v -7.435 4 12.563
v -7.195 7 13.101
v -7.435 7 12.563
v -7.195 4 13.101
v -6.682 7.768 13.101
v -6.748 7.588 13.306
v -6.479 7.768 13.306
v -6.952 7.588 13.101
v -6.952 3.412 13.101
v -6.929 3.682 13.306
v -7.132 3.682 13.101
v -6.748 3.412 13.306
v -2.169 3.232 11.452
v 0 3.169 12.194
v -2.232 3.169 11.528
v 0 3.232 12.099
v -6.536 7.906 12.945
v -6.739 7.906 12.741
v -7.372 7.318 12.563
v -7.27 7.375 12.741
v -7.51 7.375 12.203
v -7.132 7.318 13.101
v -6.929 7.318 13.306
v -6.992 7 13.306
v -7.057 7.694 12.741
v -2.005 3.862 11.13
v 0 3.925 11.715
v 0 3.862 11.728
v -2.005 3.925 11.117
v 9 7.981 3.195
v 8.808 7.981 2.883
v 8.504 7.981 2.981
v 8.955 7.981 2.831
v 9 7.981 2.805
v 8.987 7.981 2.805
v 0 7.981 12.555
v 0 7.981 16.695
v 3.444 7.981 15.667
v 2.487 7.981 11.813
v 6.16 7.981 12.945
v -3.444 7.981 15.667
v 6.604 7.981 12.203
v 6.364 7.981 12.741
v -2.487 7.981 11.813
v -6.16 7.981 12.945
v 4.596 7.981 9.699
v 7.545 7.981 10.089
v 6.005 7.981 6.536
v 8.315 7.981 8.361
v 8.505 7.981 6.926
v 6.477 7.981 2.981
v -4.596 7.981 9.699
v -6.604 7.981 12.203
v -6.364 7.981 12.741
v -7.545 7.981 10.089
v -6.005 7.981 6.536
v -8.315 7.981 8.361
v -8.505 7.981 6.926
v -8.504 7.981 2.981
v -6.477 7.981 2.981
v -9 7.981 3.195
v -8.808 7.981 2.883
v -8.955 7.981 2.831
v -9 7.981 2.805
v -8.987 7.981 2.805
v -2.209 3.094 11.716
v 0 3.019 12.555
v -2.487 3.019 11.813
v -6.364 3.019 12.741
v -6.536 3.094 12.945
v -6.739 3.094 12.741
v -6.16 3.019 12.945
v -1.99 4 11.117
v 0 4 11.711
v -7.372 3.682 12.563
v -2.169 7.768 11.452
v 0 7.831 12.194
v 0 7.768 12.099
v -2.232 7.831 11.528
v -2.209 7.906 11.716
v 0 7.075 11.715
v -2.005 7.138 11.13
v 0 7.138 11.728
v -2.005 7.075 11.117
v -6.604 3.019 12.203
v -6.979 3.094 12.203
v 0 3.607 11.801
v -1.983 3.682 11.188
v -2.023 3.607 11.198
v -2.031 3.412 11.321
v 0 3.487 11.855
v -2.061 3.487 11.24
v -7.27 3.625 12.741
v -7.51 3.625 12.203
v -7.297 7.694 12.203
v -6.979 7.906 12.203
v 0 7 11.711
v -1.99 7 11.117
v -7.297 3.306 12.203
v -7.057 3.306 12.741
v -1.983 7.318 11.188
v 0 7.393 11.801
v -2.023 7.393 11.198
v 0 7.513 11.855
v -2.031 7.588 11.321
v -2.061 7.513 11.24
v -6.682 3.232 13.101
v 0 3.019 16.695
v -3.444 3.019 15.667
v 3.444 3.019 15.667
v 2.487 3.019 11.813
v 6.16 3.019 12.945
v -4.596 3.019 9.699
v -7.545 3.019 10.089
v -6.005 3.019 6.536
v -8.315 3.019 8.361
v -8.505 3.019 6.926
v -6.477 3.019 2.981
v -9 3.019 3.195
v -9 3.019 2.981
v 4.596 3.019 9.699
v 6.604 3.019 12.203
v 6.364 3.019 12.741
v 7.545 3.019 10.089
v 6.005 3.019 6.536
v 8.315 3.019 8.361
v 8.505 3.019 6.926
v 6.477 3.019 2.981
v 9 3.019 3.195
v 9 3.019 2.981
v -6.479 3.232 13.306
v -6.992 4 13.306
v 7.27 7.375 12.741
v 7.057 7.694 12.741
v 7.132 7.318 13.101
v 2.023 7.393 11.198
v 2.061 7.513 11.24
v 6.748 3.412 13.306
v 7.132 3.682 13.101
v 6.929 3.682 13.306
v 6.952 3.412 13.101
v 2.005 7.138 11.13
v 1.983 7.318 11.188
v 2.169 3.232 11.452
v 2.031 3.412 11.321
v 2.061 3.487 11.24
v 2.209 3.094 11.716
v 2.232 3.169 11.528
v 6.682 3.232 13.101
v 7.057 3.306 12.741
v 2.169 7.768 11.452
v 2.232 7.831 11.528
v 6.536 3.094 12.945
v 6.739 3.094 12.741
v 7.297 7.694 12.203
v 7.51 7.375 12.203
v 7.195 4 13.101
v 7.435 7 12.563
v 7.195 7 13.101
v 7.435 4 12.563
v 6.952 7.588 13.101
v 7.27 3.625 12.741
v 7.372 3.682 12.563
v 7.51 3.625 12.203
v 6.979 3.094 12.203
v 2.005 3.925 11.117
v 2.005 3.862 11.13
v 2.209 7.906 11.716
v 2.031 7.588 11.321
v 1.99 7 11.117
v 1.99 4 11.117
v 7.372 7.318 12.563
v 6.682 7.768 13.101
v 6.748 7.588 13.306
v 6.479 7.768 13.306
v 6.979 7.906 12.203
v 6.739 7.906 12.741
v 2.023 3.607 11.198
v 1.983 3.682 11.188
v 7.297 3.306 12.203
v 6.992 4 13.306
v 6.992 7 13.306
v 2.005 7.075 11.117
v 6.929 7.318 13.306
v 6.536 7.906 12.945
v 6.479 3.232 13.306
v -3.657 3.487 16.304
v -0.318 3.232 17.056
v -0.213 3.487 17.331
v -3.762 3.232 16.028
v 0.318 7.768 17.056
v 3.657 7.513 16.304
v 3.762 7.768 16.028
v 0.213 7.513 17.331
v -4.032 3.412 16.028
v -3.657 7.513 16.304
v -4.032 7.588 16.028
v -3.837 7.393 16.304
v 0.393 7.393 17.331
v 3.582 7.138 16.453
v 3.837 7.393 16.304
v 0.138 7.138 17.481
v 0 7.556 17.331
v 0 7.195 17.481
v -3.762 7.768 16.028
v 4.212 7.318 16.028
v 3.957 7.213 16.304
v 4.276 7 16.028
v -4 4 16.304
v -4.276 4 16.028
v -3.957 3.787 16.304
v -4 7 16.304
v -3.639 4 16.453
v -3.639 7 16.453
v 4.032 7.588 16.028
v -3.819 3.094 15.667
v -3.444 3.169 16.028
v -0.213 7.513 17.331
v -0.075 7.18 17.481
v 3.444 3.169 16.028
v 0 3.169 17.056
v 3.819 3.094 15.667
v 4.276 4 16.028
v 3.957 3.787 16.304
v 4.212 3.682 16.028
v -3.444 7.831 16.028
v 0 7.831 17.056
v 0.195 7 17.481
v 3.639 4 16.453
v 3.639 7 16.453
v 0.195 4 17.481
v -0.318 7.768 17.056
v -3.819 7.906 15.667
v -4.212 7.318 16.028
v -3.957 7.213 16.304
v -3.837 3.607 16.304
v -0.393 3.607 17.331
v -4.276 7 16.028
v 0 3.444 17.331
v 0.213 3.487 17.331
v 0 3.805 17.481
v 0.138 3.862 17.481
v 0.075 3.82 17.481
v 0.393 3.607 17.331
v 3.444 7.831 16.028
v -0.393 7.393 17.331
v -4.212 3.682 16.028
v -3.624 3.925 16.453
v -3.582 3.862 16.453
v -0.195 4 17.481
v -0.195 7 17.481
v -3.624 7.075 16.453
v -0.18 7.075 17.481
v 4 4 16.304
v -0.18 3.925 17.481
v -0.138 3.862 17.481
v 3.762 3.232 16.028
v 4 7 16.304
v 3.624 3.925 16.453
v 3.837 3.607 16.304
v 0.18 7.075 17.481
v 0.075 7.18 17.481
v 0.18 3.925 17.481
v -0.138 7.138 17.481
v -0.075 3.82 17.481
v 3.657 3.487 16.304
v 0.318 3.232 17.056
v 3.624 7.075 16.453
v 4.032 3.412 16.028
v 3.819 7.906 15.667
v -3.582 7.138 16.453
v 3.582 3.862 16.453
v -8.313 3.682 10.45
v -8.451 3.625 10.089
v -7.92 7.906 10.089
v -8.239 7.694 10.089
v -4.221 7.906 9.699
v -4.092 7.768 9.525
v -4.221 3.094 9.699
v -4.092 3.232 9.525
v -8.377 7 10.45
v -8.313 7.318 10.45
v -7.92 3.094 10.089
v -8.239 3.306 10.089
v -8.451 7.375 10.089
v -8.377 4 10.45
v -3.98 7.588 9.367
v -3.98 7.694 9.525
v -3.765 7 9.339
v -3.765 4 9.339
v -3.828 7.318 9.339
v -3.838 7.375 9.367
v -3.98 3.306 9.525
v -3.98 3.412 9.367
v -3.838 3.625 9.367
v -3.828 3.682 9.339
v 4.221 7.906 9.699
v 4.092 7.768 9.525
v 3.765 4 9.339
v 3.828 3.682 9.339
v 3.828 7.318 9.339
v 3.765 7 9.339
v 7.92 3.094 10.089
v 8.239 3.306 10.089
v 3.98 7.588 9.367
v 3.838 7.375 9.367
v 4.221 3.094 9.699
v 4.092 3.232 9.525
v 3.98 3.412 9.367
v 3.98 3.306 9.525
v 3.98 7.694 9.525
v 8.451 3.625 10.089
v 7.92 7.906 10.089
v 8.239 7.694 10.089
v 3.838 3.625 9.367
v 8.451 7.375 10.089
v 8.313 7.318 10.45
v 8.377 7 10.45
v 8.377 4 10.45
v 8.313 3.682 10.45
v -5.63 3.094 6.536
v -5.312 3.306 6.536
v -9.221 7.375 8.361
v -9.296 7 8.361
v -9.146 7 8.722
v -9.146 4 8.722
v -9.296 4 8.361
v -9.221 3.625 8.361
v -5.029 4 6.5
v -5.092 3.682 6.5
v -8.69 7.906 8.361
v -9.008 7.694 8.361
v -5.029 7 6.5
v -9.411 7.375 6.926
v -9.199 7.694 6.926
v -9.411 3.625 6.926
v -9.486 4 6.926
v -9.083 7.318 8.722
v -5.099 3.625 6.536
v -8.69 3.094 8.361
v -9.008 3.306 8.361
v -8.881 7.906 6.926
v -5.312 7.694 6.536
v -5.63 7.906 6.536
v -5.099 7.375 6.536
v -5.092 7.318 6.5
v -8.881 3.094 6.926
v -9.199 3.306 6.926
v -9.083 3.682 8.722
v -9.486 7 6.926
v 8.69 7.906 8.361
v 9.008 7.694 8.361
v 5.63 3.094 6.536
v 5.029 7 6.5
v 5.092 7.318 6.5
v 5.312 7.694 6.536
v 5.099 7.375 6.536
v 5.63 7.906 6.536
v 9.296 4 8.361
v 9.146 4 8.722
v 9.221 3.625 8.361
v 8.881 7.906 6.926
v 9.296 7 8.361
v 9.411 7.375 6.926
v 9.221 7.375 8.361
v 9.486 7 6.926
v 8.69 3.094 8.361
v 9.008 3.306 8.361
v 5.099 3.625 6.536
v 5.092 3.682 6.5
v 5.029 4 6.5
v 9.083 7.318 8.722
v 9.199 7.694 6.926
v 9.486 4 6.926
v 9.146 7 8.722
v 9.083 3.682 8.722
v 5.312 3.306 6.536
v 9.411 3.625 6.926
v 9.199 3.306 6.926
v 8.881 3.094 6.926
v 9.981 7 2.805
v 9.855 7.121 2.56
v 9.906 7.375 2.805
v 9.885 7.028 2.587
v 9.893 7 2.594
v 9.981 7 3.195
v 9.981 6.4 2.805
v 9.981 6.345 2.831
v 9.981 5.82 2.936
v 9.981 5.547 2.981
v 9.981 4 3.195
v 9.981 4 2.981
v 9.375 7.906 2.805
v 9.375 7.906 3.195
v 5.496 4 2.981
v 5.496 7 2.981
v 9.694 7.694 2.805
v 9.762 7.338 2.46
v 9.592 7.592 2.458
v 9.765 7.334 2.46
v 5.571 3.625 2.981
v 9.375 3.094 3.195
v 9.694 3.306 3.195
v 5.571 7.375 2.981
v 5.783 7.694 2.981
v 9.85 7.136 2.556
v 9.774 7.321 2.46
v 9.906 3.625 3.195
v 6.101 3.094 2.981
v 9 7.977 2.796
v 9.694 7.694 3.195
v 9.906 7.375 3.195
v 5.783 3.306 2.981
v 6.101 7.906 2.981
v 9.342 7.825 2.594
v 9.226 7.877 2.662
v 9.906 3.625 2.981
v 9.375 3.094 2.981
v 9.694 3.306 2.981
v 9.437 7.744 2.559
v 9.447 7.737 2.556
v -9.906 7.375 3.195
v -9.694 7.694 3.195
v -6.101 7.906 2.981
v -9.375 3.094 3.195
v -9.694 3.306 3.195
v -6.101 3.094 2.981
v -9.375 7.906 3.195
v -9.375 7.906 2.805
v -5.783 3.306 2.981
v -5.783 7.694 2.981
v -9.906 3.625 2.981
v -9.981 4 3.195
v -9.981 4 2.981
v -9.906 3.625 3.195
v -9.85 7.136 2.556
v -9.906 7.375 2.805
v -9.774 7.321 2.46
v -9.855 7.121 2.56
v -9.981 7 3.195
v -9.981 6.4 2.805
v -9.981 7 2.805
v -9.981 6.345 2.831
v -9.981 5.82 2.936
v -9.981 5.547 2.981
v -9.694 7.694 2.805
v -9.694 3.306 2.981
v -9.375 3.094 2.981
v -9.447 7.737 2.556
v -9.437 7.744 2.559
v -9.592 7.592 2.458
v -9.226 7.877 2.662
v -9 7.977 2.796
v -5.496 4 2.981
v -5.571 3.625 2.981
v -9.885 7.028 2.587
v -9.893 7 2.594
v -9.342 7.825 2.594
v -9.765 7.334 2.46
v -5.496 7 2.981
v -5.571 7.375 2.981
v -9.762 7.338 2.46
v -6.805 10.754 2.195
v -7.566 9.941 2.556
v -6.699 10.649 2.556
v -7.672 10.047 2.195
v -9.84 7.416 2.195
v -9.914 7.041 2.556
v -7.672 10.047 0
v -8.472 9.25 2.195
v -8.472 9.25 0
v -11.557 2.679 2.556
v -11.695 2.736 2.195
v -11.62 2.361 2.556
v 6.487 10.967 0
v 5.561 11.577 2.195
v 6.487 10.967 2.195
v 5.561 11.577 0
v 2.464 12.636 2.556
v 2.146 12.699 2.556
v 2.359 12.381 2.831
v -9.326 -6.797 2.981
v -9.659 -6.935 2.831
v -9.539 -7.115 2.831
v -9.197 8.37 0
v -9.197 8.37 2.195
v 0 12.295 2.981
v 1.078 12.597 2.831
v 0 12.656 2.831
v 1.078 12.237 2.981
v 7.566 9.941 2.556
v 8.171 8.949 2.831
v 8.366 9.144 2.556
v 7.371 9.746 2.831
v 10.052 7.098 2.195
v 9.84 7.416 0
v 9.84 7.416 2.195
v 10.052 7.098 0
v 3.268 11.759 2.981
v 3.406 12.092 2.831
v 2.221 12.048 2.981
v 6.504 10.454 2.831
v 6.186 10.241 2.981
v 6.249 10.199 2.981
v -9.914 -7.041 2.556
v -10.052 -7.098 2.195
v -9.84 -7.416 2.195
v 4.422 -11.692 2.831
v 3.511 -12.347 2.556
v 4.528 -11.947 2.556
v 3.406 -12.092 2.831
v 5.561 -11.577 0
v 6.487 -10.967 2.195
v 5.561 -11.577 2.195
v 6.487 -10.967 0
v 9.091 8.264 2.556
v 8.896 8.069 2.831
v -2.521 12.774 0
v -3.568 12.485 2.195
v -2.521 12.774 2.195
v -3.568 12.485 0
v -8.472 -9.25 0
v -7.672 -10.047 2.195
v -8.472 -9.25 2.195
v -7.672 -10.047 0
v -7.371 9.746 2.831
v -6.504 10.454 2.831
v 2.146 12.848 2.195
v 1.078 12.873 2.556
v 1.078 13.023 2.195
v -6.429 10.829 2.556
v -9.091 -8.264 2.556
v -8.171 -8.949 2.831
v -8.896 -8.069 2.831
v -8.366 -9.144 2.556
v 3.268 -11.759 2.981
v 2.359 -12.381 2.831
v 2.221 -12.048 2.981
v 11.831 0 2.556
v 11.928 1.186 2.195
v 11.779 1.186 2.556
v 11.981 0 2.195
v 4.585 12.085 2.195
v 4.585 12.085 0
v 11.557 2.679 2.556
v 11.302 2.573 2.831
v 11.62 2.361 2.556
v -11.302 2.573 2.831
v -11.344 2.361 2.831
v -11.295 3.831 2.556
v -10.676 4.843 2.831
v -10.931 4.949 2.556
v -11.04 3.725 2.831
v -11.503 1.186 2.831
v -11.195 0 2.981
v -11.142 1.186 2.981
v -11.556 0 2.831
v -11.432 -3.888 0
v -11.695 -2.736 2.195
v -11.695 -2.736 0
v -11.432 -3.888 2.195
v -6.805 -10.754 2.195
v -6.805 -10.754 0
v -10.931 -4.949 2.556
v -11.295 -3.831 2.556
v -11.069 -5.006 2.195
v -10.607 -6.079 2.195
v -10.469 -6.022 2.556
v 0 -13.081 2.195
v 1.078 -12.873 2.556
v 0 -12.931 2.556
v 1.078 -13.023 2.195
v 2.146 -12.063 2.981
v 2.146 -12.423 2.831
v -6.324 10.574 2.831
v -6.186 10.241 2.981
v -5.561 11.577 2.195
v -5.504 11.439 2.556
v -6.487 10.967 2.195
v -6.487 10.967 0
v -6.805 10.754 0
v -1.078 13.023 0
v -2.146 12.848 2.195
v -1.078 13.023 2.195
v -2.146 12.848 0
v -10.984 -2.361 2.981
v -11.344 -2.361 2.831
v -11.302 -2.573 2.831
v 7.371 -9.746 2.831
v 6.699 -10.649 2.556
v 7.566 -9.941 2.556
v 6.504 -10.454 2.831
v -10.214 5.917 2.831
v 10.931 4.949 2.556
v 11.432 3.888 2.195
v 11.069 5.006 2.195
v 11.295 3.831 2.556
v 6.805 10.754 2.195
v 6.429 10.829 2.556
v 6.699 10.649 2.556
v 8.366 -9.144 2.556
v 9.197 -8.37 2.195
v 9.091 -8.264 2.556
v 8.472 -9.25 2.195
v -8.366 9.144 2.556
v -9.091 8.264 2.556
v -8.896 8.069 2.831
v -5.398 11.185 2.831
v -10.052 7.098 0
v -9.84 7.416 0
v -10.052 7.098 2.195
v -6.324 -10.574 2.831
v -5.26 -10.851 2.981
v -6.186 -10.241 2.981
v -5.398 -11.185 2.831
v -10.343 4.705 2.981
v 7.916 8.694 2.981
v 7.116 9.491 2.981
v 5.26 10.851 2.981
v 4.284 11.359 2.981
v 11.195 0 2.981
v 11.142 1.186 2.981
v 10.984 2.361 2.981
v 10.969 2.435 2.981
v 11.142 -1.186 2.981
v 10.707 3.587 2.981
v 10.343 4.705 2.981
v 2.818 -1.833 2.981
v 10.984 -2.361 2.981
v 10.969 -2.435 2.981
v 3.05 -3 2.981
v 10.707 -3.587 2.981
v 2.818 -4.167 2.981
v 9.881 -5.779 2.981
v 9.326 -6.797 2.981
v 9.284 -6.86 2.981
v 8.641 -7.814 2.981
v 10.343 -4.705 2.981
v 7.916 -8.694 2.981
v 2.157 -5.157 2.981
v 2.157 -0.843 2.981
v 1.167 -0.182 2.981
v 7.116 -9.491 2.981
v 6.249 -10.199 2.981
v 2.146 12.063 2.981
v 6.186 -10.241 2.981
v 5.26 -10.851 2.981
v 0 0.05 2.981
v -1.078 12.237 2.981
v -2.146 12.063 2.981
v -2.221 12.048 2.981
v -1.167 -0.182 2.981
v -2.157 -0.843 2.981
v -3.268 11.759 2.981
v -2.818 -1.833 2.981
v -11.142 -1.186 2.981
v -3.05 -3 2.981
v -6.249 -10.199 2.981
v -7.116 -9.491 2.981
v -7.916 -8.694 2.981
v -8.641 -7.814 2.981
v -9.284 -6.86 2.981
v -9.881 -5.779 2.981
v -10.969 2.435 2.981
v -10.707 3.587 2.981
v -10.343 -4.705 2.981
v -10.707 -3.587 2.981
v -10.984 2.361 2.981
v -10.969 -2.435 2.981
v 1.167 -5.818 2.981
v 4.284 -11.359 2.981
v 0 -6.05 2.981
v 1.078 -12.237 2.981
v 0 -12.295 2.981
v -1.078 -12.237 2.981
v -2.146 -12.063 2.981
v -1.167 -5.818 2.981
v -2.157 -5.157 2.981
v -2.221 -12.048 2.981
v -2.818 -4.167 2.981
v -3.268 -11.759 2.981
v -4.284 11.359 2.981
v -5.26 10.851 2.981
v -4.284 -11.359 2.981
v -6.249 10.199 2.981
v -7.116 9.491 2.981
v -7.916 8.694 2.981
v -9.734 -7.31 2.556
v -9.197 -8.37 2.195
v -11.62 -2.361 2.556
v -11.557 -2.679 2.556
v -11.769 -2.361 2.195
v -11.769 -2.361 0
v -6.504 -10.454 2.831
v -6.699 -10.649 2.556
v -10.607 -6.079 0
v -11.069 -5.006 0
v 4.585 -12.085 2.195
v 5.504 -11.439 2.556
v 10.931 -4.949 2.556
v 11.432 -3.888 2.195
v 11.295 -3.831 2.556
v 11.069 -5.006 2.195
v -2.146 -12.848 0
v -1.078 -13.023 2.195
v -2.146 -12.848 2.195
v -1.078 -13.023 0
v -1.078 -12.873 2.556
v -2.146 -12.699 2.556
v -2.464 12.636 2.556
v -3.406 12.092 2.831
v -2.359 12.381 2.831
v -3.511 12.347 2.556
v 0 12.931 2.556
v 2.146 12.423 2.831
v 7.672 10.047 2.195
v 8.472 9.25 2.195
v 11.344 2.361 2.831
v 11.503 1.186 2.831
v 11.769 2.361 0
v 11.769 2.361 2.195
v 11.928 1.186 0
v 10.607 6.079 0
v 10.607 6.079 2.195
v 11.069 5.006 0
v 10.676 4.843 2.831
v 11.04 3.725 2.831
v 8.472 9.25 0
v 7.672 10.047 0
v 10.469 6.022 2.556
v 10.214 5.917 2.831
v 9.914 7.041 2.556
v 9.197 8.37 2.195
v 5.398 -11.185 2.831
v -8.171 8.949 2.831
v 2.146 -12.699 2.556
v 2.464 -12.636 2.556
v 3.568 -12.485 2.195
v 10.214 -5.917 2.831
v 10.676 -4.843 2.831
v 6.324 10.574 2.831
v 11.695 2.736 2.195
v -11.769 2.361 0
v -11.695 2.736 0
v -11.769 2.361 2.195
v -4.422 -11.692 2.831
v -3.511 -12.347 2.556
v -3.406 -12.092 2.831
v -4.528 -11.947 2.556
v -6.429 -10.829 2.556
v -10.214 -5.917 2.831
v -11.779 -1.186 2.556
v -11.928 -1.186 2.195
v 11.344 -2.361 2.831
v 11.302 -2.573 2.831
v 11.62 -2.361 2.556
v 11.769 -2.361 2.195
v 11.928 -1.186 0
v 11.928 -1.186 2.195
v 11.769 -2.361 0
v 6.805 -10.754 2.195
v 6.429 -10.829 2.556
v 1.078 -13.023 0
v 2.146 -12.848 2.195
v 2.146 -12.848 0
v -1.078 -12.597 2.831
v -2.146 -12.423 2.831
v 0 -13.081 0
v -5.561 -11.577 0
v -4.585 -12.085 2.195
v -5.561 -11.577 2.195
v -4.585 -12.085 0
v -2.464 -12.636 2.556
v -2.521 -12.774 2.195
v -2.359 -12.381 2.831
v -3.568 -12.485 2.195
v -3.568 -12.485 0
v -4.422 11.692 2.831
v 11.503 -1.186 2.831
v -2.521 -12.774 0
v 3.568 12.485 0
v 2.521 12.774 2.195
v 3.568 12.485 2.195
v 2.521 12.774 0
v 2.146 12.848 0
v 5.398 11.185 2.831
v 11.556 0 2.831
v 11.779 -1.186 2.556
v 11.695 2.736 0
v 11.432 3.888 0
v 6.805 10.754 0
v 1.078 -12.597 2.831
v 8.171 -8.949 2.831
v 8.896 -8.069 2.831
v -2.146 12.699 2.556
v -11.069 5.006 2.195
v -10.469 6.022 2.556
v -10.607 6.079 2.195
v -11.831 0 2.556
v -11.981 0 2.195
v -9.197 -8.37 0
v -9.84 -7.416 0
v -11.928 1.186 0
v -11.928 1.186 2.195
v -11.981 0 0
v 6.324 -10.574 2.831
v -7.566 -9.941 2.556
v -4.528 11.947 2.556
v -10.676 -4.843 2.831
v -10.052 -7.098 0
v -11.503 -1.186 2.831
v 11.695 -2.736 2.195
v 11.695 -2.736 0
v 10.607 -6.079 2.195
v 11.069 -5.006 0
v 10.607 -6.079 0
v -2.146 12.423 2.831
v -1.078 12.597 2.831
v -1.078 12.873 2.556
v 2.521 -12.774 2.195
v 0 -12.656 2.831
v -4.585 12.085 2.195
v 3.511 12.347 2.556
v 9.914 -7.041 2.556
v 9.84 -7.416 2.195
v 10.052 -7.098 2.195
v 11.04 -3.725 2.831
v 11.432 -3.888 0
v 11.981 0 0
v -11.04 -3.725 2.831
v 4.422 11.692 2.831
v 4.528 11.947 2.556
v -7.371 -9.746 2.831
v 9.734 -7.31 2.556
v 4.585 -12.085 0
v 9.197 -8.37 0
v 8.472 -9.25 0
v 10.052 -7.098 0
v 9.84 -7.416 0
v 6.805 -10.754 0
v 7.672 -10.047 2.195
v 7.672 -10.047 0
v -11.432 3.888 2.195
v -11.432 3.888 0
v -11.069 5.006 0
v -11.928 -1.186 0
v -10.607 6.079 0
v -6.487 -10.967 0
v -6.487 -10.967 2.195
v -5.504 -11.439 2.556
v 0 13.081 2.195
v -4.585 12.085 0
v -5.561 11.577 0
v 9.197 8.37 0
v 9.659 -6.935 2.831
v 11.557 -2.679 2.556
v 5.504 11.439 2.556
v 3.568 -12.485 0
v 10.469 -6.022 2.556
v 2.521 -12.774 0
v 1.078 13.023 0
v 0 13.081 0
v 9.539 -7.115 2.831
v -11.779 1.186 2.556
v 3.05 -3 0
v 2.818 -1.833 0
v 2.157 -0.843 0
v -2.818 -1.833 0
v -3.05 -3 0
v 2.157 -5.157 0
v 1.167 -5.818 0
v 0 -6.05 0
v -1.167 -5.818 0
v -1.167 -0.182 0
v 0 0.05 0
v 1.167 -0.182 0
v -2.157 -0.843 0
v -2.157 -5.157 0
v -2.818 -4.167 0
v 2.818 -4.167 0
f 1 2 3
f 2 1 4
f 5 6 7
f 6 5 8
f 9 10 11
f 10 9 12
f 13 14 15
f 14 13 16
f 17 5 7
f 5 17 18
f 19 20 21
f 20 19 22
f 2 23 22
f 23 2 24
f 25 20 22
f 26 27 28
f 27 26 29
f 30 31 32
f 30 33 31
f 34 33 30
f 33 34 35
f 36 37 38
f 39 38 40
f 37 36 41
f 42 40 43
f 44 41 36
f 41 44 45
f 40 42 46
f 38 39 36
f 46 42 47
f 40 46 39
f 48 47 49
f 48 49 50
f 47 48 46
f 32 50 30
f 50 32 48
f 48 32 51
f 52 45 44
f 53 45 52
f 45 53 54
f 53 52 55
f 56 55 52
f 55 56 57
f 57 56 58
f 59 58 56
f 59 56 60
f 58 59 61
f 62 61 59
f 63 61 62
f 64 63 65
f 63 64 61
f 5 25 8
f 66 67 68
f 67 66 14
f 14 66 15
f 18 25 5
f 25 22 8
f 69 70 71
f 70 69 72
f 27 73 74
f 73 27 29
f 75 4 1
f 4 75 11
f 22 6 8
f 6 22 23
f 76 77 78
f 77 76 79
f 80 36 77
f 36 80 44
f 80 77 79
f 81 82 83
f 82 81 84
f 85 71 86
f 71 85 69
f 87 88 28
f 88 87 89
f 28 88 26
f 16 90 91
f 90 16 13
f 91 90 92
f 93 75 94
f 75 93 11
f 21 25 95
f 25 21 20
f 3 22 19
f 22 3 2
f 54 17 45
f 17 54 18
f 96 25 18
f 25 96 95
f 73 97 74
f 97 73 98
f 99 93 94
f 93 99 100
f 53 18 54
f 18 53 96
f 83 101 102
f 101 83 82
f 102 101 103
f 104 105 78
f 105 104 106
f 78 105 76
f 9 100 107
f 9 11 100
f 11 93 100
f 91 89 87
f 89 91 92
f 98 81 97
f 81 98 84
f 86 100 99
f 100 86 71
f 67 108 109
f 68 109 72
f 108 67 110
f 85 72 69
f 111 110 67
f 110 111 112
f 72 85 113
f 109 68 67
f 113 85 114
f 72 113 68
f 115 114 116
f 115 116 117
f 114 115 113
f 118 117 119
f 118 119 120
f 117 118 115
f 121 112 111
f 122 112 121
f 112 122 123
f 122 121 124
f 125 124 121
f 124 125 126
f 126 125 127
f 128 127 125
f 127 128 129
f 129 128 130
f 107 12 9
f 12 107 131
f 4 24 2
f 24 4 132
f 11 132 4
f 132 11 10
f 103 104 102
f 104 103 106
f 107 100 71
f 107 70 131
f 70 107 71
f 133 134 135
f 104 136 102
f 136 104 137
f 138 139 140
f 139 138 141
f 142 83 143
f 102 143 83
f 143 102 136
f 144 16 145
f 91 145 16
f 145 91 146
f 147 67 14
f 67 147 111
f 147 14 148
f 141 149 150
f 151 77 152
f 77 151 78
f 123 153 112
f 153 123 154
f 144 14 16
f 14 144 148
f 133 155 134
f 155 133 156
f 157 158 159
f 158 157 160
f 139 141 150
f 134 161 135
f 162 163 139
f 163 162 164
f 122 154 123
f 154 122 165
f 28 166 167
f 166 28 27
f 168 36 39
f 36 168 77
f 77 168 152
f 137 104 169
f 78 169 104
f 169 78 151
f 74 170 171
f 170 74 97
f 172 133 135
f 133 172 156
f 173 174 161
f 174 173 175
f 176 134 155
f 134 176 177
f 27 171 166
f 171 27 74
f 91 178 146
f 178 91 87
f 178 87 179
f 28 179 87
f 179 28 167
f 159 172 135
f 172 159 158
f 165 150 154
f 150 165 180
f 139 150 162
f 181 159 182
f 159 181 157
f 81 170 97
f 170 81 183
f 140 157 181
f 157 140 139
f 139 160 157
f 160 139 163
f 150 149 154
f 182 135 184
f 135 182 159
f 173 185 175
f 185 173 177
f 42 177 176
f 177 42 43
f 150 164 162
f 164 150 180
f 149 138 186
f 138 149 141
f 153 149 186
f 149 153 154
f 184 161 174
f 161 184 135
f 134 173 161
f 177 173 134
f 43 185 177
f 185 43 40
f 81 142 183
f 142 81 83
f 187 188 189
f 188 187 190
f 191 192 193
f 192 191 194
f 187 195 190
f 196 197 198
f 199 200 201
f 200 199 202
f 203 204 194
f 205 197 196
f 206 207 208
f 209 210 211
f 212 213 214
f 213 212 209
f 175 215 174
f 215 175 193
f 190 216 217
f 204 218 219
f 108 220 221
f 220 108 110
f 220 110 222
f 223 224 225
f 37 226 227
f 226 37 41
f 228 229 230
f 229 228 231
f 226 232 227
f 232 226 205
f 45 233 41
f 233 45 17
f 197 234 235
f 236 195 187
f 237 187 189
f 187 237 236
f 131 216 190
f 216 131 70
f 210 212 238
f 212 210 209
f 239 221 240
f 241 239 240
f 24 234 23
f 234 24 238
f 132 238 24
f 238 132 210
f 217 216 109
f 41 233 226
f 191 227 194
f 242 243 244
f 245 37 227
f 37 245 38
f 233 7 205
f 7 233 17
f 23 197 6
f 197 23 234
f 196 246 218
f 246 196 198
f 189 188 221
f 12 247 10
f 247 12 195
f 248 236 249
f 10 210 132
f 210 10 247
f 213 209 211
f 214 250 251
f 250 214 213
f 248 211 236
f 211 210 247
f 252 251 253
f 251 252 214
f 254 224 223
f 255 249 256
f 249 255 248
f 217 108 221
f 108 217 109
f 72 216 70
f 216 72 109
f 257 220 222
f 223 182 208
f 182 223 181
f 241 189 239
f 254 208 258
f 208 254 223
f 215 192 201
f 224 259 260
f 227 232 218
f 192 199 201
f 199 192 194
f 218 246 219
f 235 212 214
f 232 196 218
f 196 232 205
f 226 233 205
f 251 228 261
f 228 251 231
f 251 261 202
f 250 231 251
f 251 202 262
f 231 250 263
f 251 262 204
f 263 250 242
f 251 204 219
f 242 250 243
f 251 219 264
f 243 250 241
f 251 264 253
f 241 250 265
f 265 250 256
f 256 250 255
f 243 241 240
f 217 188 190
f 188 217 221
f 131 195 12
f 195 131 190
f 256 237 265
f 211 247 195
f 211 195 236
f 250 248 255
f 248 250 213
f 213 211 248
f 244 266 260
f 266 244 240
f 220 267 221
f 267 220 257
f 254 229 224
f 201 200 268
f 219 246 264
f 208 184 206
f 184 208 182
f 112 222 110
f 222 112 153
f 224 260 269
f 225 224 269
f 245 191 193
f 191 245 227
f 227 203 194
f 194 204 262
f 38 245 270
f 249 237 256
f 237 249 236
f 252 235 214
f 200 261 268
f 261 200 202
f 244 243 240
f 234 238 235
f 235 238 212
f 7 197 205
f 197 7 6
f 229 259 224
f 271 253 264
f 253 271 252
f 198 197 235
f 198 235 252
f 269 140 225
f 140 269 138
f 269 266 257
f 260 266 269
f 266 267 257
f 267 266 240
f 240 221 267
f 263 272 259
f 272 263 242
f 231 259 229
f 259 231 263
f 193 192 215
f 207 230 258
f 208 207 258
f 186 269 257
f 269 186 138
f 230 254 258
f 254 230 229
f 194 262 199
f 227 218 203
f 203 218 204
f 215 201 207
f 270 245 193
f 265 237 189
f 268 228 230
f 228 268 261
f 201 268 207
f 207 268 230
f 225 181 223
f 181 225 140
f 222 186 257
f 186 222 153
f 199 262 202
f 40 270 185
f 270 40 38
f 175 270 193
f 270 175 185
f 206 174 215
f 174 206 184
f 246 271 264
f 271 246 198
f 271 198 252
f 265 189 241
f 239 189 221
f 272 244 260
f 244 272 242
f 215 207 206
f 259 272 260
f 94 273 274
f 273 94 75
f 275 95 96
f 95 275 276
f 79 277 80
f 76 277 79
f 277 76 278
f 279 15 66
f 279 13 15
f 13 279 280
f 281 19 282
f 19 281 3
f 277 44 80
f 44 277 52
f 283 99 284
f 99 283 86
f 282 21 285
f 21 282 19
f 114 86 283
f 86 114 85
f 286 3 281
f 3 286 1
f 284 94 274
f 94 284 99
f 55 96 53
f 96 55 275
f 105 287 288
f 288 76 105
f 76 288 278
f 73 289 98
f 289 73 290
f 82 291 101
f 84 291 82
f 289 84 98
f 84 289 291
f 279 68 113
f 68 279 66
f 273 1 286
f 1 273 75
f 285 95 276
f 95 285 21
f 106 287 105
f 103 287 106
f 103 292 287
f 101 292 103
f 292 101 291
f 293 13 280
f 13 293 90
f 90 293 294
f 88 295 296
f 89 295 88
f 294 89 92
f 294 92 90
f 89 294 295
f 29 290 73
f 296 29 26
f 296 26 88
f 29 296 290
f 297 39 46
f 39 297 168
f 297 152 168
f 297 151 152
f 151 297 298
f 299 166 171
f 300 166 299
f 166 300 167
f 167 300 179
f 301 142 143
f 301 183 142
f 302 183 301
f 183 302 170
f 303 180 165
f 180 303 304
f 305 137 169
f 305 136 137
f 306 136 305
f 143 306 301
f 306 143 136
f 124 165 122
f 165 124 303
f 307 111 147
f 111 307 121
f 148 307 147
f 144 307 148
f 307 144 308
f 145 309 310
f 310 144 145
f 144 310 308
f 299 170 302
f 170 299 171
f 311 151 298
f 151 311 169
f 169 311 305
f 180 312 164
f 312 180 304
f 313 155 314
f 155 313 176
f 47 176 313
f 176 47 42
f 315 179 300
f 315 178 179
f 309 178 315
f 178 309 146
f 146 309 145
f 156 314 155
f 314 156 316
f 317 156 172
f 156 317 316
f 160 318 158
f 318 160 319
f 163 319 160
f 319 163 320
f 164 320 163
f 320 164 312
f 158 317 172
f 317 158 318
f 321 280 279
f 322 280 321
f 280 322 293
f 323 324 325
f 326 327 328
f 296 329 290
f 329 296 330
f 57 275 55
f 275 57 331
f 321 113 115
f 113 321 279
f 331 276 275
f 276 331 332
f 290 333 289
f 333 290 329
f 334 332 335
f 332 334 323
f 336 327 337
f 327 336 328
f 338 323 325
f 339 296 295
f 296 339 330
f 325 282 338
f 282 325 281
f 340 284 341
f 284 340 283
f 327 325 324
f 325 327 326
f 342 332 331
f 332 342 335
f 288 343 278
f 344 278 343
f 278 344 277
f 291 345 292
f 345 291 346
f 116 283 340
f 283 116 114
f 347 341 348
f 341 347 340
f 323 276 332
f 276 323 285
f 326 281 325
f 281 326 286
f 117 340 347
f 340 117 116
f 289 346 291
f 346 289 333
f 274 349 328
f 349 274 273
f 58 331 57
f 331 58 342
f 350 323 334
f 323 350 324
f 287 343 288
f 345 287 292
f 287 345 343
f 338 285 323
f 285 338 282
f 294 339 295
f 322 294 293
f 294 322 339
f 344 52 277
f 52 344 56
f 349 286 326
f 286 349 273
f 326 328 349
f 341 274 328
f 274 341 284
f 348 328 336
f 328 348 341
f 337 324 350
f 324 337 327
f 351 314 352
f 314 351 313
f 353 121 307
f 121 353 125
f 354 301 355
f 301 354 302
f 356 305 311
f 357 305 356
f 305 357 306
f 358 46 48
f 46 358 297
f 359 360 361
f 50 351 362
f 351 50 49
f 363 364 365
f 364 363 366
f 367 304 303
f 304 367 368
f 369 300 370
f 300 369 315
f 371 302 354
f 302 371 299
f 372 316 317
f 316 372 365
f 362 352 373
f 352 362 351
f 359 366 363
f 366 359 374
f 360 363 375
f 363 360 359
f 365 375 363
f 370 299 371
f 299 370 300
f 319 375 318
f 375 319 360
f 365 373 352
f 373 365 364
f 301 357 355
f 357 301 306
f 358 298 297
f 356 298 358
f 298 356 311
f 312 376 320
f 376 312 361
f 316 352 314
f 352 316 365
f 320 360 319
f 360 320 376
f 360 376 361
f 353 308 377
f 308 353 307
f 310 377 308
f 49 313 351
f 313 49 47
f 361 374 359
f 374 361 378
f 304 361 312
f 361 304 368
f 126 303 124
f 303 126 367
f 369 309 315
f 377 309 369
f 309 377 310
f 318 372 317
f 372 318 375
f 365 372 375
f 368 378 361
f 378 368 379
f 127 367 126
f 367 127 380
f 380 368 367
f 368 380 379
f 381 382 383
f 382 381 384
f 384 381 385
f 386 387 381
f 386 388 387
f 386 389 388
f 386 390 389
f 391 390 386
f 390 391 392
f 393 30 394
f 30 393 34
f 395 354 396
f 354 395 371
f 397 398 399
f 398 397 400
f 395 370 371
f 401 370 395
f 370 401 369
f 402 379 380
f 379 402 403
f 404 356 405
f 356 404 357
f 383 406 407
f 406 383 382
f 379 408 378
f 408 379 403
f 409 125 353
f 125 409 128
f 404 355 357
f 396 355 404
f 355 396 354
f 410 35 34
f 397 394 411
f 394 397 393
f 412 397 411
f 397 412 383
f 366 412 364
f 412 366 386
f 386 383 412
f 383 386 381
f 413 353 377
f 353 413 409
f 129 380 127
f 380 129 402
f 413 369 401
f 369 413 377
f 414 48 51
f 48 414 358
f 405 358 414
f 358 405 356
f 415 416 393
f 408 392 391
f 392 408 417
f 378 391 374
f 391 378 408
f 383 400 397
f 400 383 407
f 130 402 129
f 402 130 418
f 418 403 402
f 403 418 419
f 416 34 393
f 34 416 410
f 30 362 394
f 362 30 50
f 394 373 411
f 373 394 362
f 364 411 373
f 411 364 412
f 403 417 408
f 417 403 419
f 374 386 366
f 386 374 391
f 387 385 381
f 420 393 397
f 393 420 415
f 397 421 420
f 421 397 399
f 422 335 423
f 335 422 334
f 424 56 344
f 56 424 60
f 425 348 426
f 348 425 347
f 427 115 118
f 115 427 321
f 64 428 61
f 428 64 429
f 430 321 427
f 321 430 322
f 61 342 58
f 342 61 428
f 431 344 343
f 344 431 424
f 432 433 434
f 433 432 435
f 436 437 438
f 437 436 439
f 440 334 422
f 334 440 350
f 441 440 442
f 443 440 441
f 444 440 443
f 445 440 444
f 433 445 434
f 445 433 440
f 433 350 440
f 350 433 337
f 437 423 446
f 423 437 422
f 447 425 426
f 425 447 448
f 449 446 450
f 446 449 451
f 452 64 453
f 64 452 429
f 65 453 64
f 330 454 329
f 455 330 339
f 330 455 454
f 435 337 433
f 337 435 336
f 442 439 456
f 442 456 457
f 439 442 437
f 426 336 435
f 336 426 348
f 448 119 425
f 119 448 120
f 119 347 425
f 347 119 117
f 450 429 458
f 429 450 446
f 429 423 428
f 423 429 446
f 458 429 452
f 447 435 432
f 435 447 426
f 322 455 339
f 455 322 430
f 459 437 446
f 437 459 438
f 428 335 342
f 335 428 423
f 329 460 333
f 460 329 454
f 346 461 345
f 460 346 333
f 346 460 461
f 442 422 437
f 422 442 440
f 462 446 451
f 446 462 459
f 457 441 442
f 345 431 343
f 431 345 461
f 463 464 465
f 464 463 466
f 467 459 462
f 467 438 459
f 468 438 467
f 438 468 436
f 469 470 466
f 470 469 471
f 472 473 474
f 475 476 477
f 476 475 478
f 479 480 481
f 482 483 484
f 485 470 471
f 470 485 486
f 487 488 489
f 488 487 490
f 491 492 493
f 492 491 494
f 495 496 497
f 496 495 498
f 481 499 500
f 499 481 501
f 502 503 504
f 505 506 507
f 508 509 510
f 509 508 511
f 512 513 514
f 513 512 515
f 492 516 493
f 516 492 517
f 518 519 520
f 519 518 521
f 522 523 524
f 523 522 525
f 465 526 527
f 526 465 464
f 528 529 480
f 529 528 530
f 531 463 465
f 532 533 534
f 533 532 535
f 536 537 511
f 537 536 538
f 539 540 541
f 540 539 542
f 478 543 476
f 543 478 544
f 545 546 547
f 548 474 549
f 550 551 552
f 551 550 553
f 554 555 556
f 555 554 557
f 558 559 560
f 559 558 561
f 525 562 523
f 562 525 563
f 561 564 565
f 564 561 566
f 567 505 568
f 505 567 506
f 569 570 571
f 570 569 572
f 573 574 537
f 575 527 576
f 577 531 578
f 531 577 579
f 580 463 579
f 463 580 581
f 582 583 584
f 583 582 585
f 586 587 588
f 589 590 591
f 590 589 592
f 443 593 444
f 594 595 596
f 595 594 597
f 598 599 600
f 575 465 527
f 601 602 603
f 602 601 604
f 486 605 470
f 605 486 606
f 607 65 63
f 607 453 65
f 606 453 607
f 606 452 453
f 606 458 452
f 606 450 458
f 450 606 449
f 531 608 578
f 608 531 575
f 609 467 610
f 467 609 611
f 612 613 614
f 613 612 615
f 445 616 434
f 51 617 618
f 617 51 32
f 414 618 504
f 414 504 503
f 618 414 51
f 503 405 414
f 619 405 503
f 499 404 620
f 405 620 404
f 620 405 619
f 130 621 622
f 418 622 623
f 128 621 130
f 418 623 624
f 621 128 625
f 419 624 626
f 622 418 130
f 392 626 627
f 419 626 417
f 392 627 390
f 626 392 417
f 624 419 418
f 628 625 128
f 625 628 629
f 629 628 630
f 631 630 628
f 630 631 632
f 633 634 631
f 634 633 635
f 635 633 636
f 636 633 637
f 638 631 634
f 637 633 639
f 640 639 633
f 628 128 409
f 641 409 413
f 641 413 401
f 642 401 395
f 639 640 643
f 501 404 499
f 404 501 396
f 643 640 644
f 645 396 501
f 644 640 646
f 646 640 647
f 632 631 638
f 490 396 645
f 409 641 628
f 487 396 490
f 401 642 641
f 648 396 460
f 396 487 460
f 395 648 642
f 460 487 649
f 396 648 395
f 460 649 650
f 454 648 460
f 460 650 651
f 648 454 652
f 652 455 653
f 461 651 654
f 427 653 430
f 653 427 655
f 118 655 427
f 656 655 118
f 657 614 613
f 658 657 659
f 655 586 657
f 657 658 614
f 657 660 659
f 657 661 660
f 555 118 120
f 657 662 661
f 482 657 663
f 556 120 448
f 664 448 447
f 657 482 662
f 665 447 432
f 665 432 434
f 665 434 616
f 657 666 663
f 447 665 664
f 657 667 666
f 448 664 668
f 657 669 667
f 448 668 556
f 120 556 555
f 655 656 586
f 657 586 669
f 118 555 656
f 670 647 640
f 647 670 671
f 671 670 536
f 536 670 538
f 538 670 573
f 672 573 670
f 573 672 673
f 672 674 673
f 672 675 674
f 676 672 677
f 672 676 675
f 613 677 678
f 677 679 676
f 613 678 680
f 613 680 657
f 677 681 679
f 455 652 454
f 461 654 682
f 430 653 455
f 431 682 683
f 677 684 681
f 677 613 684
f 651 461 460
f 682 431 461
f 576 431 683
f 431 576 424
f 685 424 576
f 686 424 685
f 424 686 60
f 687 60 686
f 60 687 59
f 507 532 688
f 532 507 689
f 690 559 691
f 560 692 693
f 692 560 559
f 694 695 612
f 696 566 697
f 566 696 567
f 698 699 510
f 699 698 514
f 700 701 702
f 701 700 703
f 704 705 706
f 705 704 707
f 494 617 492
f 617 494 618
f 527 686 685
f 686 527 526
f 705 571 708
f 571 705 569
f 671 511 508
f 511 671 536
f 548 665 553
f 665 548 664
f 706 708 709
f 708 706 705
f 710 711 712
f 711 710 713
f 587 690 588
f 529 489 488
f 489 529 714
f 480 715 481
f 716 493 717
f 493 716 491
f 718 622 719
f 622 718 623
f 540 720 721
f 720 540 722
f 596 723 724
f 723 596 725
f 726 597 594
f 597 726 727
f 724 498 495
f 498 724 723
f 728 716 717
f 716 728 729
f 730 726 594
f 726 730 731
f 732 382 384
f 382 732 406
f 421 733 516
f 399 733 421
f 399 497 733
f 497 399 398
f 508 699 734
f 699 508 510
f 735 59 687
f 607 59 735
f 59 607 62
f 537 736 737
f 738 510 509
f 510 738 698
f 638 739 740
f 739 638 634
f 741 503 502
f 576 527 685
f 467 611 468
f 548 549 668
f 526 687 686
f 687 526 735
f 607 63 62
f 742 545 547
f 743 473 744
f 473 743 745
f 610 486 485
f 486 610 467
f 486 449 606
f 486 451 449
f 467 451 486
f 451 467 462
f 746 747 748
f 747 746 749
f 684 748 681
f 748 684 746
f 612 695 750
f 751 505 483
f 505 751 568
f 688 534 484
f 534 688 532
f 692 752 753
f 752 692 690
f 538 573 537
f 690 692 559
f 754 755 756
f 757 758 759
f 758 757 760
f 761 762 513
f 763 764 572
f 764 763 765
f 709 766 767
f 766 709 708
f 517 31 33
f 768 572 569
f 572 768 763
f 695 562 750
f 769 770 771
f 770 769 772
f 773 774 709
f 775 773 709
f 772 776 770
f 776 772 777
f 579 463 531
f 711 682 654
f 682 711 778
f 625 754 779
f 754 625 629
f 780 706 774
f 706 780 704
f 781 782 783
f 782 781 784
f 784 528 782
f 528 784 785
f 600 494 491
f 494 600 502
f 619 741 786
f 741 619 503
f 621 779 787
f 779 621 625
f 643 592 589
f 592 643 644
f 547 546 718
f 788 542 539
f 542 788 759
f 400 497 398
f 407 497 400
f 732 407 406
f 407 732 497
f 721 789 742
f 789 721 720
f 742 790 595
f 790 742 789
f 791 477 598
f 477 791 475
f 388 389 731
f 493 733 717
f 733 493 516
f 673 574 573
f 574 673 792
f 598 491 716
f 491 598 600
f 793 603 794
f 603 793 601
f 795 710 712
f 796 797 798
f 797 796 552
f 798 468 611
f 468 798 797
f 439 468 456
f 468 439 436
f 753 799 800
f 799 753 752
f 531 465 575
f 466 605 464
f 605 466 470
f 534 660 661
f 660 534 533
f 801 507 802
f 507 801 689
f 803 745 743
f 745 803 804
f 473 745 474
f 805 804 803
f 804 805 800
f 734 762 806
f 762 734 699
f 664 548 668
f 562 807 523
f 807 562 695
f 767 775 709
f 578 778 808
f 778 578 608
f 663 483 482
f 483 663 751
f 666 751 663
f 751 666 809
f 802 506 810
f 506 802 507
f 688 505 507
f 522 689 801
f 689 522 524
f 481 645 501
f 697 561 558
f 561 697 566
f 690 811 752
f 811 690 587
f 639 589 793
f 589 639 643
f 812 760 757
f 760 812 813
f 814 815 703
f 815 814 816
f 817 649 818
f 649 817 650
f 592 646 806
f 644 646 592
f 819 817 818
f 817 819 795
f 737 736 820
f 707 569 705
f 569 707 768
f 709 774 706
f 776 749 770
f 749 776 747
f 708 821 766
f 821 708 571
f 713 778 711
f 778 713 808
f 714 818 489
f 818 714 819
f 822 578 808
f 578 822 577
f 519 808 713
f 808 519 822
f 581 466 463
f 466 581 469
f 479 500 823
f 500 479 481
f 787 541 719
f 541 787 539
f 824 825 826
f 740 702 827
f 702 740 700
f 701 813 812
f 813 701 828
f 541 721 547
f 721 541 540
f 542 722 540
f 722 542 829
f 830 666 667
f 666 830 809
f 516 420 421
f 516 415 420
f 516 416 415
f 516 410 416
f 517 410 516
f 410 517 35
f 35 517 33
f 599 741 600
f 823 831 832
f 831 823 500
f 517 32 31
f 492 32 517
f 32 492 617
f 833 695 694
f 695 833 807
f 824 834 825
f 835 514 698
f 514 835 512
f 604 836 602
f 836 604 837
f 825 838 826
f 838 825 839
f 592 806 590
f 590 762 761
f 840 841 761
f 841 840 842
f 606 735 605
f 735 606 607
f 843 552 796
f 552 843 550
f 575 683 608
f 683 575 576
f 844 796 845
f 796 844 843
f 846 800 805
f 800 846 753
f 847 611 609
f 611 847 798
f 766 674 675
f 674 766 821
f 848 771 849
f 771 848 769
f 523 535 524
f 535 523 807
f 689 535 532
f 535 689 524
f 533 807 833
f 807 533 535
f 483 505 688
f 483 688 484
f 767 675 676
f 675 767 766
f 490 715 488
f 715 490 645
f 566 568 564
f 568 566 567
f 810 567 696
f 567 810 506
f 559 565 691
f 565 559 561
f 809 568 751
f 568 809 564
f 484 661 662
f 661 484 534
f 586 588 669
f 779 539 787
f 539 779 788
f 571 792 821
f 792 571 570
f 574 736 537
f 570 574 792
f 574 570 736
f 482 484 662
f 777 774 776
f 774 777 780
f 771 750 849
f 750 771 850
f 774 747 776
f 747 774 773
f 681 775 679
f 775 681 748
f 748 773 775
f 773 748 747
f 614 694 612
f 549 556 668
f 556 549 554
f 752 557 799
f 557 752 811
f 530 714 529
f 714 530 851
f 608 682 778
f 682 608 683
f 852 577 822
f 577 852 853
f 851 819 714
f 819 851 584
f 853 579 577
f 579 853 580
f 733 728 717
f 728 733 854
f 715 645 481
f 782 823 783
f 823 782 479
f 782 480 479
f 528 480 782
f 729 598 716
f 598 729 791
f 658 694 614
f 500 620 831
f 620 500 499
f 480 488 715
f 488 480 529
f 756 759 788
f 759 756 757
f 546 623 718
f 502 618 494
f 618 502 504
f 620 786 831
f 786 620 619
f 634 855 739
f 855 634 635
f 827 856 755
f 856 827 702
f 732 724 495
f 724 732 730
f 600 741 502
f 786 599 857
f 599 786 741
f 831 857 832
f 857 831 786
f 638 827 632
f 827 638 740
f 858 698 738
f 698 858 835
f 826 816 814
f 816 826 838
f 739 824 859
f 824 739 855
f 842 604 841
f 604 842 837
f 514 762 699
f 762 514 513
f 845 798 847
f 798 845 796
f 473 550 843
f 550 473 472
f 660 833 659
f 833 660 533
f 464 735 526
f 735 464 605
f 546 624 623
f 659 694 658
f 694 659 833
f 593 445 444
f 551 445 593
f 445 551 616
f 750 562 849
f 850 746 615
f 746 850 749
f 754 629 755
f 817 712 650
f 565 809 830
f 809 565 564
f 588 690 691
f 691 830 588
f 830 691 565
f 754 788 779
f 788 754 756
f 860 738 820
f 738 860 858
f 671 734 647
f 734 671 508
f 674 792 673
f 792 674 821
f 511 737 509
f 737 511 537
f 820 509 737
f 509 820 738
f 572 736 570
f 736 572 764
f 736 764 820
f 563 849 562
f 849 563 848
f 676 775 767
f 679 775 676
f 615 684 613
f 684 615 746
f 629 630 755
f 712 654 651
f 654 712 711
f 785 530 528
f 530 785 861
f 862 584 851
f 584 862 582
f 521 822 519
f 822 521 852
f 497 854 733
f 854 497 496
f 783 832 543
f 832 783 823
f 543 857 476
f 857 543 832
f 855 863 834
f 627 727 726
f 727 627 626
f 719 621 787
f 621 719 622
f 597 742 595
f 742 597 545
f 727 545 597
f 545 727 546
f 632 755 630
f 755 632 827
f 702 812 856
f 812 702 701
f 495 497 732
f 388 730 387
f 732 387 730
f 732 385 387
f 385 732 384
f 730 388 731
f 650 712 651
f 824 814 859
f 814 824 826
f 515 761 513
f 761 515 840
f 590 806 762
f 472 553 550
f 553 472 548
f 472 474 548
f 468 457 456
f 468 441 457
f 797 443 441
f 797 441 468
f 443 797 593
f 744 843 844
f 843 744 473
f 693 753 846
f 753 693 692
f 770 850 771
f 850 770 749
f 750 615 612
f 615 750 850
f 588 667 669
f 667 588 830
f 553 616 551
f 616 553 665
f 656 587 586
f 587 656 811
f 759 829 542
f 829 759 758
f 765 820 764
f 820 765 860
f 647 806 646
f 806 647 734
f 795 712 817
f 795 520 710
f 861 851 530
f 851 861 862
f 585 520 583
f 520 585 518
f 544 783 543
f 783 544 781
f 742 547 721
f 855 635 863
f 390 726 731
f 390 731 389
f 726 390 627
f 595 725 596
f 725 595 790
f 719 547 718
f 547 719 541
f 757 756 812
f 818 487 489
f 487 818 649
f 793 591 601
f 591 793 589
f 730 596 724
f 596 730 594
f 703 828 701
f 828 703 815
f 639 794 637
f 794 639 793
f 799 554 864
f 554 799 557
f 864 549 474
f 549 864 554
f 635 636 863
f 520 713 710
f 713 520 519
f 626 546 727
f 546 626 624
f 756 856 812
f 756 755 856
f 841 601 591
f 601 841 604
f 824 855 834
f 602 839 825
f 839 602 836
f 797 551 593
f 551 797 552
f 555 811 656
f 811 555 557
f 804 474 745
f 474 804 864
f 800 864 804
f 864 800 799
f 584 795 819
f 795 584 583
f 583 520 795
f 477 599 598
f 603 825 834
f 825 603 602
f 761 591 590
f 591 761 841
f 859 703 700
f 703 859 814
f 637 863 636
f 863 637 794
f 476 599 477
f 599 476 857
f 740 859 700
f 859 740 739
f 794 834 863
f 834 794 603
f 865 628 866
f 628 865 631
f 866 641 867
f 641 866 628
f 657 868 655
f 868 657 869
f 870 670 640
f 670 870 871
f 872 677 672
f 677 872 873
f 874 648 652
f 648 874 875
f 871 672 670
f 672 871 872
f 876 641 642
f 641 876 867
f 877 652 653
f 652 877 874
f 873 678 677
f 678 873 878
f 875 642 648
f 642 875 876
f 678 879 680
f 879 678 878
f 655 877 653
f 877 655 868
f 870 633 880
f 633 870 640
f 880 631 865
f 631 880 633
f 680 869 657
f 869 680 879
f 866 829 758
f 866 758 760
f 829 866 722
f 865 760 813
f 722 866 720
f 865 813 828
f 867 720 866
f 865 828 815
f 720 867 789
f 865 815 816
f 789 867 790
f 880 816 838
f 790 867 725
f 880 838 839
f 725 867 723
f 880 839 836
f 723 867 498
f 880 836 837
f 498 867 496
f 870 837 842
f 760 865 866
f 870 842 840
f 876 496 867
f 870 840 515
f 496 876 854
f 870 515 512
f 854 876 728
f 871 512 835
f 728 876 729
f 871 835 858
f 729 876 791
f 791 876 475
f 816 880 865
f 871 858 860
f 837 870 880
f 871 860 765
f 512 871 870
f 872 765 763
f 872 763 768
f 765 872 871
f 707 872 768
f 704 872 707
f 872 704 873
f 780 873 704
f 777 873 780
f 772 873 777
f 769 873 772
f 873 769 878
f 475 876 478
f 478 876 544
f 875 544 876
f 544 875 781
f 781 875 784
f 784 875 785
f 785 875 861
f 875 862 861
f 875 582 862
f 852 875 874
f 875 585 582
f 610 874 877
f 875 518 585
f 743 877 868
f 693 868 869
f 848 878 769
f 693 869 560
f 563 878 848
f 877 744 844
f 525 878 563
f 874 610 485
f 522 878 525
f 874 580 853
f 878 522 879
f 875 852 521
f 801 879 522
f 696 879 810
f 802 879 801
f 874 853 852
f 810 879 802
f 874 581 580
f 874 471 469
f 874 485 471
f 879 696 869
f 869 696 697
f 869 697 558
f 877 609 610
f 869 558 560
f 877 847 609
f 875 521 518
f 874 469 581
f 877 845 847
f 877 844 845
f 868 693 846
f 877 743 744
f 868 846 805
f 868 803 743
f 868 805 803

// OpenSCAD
base_dia = 22;
base_h = 2;

eye_od = 18;
eye_id = 13;
eye_depth = 3;
eye_offset = 7;

module hook() {
     difference() {
          minkowski() {
               union() {
                    scale([1,1.1,1])
                         cylinder(r=base_dia/2, h=base_h, $fn=$fn*4);

                    // eye
                    scale([1,1,1.5])
                         translate([0, eye_offset, base_h]) rotate([90,0,0]) linear_extrude(eye_depth) difference() {
                         // eye body
                         circle(r=eye_od/2);

                         // eye hole
                         circle(r=eye_id/2);
                         translate([0, -eye_od]) square([eye_od, eye_od*2], center=true);
                    }
               }
               sphere(r=1);
          }

          // screw hole
          translate([0,-3,0])
          cylinder(r=6.1/2, h=10, center=true);

          // flatten bottom
          rotate([180,0,0]) cylinder(r=base_dia, h=base_h);
     }
}


hook($fn=16);
//hook();

//translate([0,-3,5])cylinder(r=11/2, h=1);
